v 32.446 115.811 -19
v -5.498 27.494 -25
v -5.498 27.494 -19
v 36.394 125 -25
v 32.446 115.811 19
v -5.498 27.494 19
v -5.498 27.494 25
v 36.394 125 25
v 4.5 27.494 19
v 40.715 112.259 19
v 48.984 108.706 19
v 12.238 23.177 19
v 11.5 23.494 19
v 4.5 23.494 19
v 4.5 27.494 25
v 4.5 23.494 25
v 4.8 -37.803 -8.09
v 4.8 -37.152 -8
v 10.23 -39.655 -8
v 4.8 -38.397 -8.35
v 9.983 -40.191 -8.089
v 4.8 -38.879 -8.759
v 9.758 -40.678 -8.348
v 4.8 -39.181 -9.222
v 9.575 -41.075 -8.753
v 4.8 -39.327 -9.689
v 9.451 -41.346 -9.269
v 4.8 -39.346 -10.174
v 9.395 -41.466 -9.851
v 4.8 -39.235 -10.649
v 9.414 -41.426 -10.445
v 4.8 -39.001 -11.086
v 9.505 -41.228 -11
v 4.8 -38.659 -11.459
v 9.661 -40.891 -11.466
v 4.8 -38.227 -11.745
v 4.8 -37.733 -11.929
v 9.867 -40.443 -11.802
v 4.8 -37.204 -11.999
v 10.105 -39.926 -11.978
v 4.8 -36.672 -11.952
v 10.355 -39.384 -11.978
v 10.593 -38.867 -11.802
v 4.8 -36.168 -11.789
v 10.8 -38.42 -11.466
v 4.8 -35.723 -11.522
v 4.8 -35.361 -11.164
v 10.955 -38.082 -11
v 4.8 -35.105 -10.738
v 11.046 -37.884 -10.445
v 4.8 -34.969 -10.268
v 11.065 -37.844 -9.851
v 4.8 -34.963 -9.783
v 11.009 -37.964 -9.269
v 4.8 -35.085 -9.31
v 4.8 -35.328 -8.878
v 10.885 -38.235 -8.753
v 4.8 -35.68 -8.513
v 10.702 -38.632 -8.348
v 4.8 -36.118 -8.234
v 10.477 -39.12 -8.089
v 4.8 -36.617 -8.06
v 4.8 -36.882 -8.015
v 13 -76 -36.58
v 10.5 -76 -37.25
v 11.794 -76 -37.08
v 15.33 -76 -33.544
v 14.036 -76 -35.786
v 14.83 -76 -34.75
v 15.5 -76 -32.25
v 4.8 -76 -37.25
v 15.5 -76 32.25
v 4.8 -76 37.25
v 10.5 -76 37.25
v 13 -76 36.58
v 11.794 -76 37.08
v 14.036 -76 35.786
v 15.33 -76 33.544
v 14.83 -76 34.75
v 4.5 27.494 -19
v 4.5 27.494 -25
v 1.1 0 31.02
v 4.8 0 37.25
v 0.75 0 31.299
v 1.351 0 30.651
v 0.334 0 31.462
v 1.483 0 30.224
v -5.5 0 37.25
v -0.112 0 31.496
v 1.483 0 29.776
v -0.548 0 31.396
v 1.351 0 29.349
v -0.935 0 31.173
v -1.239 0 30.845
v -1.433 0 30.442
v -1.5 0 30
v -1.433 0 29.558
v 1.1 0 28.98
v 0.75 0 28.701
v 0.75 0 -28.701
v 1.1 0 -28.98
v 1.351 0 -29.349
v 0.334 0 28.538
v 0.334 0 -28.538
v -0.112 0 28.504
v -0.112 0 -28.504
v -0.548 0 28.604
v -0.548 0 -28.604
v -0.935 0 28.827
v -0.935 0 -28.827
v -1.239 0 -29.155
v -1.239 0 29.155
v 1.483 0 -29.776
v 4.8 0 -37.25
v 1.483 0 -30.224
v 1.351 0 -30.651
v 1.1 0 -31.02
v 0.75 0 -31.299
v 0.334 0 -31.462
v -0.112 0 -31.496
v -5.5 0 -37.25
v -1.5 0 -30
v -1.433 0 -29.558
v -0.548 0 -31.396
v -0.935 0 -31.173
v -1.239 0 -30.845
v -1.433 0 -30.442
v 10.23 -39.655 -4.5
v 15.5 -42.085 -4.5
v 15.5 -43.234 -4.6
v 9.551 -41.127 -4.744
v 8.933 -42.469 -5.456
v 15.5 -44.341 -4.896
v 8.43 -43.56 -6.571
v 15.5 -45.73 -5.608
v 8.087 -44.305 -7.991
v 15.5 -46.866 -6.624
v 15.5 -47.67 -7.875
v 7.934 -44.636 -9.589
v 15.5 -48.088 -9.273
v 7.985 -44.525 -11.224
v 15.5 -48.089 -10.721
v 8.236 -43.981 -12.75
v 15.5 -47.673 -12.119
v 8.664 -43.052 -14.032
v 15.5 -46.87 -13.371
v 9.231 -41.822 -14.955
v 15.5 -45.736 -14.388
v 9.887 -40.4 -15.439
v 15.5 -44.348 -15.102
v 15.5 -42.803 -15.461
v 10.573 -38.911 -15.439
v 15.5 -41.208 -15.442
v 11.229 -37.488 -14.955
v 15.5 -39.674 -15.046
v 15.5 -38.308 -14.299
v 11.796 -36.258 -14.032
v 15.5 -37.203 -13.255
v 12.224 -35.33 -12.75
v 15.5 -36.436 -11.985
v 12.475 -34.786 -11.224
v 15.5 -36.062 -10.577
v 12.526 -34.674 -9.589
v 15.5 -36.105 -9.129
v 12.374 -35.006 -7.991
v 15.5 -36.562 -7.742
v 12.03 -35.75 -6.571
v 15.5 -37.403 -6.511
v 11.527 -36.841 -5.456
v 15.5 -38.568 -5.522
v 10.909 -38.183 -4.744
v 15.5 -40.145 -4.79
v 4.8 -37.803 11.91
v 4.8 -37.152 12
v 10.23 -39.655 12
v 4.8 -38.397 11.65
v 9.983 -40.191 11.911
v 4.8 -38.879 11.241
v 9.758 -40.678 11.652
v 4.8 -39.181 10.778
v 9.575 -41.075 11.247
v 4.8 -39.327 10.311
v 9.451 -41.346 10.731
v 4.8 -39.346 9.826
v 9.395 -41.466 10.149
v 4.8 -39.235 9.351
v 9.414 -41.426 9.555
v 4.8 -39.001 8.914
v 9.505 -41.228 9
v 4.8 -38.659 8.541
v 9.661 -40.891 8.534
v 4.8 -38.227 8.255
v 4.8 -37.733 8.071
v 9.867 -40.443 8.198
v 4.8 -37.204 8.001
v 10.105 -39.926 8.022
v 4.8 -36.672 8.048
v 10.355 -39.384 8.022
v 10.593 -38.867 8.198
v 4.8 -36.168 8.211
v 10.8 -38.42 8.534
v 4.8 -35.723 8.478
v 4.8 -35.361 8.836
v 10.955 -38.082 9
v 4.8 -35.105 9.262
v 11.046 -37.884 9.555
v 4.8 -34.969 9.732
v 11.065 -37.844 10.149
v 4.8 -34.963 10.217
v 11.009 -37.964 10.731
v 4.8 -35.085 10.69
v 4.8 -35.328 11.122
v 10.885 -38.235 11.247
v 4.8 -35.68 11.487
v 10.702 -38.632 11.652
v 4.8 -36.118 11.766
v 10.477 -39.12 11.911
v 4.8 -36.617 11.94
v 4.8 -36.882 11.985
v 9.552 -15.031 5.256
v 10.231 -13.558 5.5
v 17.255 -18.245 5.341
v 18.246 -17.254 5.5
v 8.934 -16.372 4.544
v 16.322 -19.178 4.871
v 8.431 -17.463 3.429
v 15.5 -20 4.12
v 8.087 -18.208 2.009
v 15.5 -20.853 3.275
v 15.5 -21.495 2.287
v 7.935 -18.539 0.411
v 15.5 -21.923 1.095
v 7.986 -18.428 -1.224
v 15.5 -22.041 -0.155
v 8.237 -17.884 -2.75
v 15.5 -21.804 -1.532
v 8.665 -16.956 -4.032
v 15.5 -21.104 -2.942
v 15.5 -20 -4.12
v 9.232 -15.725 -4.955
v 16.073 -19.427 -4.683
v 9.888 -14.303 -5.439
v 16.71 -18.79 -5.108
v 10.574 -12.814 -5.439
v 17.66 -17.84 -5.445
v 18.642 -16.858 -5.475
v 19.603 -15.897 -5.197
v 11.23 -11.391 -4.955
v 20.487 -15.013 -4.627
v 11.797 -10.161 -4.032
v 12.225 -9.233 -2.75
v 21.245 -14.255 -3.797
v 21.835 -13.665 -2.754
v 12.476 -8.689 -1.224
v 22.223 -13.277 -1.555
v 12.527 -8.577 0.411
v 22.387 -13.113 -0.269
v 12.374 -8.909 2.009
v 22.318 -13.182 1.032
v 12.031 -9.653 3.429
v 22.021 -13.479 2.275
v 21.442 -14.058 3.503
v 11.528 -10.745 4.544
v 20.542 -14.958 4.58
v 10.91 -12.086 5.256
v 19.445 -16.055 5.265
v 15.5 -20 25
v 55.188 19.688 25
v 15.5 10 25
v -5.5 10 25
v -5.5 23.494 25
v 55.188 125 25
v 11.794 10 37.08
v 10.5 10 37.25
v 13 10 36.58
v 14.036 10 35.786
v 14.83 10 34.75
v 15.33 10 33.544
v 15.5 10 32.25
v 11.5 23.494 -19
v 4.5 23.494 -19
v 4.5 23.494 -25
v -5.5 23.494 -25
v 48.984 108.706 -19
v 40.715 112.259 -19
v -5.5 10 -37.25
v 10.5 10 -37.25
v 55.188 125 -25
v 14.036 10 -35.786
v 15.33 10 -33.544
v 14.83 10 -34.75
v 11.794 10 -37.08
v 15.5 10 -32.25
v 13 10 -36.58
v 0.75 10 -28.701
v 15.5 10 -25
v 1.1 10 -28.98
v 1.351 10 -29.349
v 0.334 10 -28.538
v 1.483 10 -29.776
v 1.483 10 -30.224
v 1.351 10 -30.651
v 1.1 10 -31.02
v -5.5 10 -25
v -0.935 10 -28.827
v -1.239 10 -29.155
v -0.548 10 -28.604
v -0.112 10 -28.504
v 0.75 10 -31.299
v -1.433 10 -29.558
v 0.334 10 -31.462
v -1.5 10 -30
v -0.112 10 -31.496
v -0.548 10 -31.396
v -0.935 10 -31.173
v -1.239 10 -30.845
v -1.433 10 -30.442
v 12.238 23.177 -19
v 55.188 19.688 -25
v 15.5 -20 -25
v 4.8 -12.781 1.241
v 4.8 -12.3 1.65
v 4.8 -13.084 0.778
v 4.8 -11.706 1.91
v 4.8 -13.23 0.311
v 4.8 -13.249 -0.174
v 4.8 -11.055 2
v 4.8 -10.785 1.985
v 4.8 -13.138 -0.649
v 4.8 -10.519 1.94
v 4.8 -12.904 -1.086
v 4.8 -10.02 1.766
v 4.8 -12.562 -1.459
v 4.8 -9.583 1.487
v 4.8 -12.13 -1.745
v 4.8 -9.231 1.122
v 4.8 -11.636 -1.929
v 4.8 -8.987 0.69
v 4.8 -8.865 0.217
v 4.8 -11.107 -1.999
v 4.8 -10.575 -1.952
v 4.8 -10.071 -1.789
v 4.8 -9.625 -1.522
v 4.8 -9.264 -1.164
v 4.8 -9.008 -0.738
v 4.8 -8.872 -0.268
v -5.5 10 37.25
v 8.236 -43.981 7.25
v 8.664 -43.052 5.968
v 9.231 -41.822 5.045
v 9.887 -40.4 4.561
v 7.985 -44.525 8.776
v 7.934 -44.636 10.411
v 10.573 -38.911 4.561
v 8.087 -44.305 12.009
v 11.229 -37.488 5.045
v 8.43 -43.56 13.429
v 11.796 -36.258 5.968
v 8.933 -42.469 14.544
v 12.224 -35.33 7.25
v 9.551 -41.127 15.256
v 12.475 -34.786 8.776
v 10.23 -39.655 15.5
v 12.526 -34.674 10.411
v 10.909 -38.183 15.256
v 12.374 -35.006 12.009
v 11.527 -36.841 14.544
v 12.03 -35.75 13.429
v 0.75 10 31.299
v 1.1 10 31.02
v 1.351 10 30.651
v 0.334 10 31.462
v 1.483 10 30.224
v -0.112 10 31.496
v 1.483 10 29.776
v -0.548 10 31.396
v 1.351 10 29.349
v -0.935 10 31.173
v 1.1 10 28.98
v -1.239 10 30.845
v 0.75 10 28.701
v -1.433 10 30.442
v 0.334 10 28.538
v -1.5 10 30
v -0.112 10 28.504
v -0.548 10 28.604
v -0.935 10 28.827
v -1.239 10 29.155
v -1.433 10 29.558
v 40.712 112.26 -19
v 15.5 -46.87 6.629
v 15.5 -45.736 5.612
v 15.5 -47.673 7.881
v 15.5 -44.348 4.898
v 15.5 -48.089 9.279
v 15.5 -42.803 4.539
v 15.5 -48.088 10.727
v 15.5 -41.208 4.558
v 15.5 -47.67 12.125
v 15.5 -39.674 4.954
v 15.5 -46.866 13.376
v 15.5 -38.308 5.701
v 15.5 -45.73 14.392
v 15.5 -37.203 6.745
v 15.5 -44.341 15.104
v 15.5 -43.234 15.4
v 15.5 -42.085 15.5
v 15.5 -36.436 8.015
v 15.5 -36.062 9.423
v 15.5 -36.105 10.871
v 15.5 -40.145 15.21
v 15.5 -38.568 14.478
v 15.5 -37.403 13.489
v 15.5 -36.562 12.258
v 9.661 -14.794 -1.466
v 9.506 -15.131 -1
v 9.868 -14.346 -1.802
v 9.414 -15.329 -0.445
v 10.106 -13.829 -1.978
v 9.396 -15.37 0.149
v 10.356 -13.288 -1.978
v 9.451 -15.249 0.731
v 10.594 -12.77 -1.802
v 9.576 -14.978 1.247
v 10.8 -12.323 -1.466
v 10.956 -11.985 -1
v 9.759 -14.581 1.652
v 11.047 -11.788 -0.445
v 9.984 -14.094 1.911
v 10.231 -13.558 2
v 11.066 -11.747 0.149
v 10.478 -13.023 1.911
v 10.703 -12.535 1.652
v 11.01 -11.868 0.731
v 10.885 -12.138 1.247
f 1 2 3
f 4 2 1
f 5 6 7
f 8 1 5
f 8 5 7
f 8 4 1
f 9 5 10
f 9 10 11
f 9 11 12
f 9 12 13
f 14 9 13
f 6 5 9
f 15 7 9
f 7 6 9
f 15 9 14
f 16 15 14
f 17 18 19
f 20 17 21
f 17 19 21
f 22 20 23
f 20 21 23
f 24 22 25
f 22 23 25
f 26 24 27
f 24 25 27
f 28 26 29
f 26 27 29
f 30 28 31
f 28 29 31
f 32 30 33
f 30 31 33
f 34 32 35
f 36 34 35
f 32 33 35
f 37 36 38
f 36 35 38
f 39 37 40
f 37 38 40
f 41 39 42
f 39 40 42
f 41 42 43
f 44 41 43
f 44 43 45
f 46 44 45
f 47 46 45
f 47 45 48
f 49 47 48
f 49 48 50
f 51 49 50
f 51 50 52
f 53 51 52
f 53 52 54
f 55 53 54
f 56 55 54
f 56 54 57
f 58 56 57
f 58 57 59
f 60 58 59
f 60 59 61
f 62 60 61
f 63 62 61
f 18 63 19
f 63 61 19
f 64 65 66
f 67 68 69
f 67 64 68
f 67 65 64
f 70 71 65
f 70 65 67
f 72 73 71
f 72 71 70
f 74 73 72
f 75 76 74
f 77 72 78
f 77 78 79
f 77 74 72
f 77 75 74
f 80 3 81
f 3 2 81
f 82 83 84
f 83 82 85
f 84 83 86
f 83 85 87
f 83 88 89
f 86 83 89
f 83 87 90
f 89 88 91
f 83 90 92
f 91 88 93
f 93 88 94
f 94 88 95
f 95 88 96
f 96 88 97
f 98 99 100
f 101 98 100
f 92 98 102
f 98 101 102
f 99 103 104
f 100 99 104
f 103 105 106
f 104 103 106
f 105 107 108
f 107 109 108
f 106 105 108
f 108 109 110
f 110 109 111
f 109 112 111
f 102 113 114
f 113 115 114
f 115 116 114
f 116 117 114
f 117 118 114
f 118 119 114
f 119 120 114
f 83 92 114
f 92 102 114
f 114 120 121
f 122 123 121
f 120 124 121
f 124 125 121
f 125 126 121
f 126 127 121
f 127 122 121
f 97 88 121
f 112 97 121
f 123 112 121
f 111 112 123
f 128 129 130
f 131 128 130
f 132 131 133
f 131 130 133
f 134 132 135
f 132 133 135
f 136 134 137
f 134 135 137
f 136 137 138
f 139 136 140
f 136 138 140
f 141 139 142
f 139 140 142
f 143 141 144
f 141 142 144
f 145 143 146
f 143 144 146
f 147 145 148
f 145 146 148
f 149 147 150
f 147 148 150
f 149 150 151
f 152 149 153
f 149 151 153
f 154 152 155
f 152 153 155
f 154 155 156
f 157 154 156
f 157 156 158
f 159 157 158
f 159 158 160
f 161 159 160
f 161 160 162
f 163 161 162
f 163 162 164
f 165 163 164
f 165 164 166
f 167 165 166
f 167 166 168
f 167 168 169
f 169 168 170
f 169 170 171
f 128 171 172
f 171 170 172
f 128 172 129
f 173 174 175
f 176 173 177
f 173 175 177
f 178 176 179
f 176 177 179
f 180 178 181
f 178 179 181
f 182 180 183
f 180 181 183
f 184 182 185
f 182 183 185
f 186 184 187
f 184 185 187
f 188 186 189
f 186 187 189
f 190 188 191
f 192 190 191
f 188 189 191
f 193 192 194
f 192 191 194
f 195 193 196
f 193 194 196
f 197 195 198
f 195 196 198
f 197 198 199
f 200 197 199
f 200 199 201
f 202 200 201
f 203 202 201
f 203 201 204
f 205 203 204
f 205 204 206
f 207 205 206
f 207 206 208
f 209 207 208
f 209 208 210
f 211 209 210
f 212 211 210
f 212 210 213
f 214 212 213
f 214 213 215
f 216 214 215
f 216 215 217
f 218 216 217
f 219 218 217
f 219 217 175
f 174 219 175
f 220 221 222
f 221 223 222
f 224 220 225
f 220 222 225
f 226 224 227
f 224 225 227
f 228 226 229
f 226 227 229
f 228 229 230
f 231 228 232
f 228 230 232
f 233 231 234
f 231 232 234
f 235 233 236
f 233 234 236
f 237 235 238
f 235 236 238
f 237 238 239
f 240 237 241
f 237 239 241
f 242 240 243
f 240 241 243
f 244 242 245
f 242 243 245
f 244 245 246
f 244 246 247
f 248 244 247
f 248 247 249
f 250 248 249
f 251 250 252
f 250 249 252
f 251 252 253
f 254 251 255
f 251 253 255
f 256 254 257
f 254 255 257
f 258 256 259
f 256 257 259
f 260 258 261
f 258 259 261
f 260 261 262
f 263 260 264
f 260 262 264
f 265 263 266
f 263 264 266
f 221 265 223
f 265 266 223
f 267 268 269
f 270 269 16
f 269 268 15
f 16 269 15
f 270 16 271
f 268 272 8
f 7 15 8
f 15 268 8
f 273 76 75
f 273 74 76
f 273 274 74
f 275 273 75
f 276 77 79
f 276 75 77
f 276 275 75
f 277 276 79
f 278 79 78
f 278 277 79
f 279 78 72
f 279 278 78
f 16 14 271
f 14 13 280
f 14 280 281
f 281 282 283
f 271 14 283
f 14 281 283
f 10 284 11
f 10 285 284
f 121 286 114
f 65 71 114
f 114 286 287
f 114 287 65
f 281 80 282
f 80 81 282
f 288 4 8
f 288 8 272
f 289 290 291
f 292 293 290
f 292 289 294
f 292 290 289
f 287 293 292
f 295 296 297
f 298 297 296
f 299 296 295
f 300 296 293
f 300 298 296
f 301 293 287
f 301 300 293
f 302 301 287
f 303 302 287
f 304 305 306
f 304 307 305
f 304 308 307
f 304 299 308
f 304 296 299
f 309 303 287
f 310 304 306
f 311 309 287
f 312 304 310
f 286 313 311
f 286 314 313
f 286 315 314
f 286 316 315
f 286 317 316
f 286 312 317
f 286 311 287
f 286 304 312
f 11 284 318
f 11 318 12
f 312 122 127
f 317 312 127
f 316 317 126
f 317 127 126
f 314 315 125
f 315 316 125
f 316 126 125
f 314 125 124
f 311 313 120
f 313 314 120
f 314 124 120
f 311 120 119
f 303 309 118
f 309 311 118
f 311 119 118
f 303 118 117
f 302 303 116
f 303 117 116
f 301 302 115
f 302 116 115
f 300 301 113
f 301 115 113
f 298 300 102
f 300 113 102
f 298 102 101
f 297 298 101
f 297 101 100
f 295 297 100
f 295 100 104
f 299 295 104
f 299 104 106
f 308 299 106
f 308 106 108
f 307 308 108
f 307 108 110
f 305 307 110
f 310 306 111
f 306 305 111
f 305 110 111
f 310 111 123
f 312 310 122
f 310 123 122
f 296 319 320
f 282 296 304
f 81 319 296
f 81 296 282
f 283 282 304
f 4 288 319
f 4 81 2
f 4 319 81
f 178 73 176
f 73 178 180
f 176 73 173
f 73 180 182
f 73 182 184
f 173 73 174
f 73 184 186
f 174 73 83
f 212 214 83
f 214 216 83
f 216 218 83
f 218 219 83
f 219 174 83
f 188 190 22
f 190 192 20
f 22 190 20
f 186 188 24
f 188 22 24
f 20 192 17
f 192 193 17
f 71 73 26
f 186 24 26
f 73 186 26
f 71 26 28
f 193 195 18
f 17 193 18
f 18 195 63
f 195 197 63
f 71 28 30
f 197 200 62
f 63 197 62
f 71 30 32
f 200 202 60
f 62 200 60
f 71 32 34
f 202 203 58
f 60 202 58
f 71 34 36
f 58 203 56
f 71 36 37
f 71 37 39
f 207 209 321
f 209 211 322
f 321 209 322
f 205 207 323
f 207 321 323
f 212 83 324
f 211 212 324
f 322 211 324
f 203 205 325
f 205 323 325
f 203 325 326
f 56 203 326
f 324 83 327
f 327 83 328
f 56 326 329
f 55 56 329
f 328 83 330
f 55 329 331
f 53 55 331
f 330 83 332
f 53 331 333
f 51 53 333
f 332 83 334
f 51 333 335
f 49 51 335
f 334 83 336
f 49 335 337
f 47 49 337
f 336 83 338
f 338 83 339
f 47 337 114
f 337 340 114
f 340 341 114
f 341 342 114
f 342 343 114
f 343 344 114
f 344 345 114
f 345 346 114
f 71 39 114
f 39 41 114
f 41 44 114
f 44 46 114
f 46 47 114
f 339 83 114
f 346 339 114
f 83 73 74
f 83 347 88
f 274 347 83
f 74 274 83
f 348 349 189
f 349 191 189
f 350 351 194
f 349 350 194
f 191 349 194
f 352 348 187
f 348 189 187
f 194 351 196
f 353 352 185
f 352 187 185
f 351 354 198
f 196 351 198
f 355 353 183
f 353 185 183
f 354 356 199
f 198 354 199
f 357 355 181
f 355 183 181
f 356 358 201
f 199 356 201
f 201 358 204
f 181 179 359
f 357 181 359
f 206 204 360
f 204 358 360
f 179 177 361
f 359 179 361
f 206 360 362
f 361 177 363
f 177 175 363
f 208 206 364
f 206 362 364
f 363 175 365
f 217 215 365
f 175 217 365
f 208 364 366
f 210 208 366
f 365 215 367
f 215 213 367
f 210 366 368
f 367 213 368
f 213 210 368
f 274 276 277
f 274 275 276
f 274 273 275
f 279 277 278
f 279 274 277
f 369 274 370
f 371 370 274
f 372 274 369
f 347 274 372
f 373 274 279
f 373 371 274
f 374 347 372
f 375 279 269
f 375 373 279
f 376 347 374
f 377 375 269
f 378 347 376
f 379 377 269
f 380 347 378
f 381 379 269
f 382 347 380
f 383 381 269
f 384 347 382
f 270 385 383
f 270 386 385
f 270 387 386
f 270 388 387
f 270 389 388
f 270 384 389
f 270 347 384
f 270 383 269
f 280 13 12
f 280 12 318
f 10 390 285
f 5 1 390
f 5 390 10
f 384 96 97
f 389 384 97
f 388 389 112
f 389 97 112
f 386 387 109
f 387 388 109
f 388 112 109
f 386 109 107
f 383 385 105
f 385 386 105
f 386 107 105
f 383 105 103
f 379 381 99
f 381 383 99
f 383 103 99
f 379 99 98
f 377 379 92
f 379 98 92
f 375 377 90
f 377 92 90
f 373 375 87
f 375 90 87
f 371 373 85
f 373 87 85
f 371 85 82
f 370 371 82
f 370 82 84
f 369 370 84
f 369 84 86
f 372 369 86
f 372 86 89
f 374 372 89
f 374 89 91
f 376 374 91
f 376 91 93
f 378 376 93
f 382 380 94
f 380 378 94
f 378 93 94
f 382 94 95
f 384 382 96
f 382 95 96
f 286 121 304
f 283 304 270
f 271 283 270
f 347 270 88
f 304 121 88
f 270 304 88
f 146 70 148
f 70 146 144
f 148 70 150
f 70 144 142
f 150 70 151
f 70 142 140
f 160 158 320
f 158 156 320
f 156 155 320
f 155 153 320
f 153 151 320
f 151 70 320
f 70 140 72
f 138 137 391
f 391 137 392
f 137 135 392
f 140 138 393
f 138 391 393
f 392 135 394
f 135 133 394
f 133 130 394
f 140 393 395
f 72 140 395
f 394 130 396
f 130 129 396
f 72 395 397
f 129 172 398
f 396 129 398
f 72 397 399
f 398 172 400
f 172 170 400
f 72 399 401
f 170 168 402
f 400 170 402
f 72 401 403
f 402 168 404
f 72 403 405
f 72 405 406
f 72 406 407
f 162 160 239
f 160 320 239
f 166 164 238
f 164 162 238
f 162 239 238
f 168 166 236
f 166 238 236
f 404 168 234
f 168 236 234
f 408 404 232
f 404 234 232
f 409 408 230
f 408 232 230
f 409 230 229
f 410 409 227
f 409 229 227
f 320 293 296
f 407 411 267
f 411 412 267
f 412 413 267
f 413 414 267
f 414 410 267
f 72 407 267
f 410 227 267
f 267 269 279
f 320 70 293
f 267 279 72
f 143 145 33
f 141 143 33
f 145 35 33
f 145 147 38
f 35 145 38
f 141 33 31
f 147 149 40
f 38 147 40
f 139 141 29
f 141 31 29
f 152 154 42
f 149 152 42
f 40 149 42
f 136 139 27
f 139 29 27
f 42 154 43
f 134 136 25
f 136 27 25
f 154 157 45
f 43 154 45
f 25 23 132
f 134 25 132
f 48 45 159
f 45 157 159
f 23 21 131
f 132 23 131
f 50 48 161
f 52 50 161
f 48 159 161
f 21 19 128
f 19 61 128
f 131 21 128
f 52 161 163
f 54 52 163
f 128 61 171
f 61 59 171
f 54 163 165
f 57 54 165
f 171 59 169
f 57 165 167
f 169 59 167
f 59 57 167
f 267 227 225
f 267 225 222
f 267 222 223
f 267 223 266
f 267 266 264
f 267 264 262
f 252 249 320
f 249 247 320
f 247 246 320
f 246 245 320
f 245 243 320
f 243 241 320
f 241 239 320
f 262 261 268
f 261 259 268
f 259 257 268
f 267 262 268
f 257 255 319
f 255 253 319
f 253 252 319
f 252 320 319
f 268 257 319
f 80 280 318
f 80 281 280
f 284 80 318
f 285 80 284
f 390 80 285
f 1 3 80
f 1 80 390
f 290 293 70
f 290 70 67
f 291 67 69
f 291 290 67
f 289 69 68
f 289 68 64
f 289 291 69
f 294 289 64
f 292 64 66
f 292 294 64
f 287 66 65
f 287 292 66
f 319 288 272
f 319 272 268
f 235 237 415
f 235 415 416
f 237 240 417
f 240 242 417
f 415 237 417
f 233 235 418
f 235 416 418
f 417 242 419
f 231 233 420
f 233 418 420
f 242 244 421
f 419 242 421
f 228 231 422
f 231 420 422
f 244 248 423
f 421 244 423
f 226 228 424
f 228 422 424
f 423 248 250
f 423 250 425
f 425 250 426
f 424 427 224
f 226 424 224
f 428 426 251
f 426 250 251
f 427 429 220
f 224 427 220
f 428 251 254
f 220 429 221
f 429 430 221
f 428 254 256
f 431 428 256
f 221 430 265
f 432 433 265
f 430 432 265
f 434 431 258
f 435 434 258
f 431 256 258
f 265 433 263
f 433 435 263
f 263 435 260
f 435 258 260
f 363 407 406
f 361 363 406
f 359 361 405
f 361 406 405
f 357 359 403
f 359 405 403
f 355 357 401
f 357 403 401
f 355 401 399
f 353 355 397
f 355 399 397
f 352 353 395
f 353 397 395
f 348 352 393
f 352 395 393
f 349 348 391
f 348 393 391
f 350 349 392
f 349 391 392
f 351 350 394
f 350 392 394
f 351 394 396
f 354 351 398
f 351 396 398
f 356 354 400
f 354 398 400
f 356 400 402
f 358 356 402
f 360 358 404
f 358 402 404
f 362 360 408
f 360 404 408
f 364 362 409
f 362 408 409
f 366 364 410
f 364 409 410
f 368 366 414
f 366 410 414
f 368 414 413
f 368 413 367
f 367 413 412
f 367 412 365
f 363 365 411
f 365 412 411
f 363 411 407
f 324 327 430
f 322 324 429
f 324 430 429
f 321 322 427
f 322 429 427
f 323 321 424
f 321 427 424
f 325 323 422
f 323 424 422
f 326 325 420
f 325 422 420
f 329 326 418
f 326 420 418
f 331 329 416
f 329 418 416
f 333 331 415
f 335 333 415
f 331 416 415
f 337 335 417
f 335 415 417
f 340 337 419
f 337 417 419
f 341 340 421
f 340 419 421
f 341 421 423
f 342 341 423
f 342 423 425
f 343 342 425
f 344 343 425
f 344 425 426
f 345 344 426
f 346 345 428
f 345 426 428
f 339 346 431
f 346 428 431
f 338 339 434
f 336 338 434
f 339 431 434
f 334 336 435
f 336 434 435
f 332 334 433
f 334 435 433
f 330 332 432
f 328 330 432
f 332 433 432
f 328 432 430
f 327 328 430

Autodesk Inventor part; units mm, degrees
sketch "Sketch1" plane through (0, 0, 0) normal (0, 1, 0) x (-1, 0, 0)
  line L0 (5.5, 37.25) -> (-5.5, 37.25)
  line L1 (-5.5, 37.25) -> (-5.5, -37.25)
  line L2 (-5.5, -37.25) -> (5.5, -37.25)
  line L3 (5.5, -37.25) -> (5.5, 37.25)
  line L4 (5.5, 37.25) -> (-5.5, -37.25) construction
  line L5 (-5.5, 37.25) -> (5.5, -37.25) construction
  circle A0 centre (0, 30) radius 1.5
  line L6 (5.5, 0) -> (-5.5, 0)
  circle A1 centre (0, -30) radius 1.5
  line L7 (-5.5, -25) -> (5.5, -25)
  line L8 (5.5, -25) -> (5.5, 25)
  line L9 (5.5, 25) -> (-5.5, 25)
  line L10 (-5.5, 25) -> (-5.5, -25)
  line L11 (-5.5, -25) -> (5.5, 25) construction
  line L12 (5.5, -25) -> (-5.5, 25) construction
  point P0 (0, 0)
  dimension "d0" = 11
  dimension "d1" = 74.5
  dimension "d2" = 3
  dimension "d3" = 7.25
  dimension "d28" = 50
extrude "Extrusion1" add sketch "Sketch1" along normal blind 10
sketch "Sketch2" plane through (5.5, 0, 37.25) normal (1, 0, 0) x (0, 0, -1)
  line L0 (0, 10) -> (74.5, 10) projected
  line L1 (0, 0) -> (74.5, 0) projected
  line L2 (0, 10) -> (74.5, 10)
  line L3 (74.5, 10) -> (74.5, 0)
  line L4 (74.5, 0) -> (0, 0)
  line L5 (0, 0) -> (0, 10)
  point P0 (37.25, 0)
extrude "Extrusion2" add sketch "Sketch2" along normal blind 10
sketch "Sketch3" plane through (0, 0, 0) normal (0, -1, 0) x (1, 0, 0)
  line L0 (-5.5, 37.25) -> (15.5, 37.25) projected
  line L1 (-5.5, -37.25) -> (15.5, -37.25) projected
  line L2 (15.5, 37.25) -> (4.8, 37.25)
  line L3 (4.8, 37.25) -> (4.8, -37.25)
  line L4 (4.8, -37.25) -> (15.5, -37.25)
  line L5 (15.5, -37.25) -> (15.5, 37.25)
  point P0 (0, 0)
  dimension "d9" = 10.7
extrude "Extrusion3" add sketch "Sketch3" along normal blind 76
ref_plane "Work Plane1" through (15.5, -76, -37.25) normal (-0.9081432, 0.4186597, 0) x (0, 0, 1)
ref_plane "Work Plane3" through (10.9593, -73.9067, -37.25) normal (-0.9081432, 0.4186597, 0) x (0, 0, 1)
sketch "Sketch4" plane through (10.9593, -73.9067, -37.25) normal (-0.9081432, 0.4186597, 0) x (0, 0, 1)
  circle A0 centre (37.25, 54.5) radius 2
  circle A1 centre (37.25, 54.5) radius 5.5
  circle A2 centre (27.25, 30.8) radius 2
  circle A3 centre (27.25, 30.8) radius 5.5
  line L0 (37.25, 62.5297) -> (37.25, 0)
  line L1 (0, 0) -> (74.5, 0) projected
  circle A4 centre (47.25, 30.8) radius 5.5
  circle A5 centre (47.25, 30.8) radius 2
  point P0 (37.25, 0)
  dimension "d13" = 4
  dimension "d14" = 11
  dimension "d15" = 4
  dimension "d16" = 11
  dimension "d19" = 10
  dimension "d20" = 23.7
  dimension "d23" = 54.5
extrude "Extrusion4" cut sketch "Sketch4" along normal blind 15 contours A0 L0 | A0 L0 A1 | L0 A0 | A0 L0 A1 | A2 | A3 | A4 | A5
extrude "Extrusion11" cut sketch "Sketch4" along normal blind 25.925 contours A0 L0 | A0 L0 A1 | L0 A0 | A0 L0 A1
extrude "Extrusion6" cut sketch "Sketch4" along normal through all contours A0 L0 | L0 A0 | A2 | A5
extrude "Extrusion7" add sketch "Sketch1" along normal blind 125 contours L3 L6 L1 L9 | L3 L7 L1 L6
sketch "Sketch5" plane through (5.5, 10, -25) normal (1, 0, 0) x (0, 0, -1)
  line L0 (0, 0) -> (0, 115) projected
  line L1 (0, 115) -> (0, 0)
  line L2 (0, 0) -> (-50, 0)
  line L3 (-50, 0) -> (-50, 115)
  line L4 (0, 115) -> (-50, 115)
  point P0 (-25, -10)
extrude "Extrusion8" add sketch "Sketch5" along normal blind 40
chamfer "Chamfer1" distance 40 angle 23.25 1 edges at (-5.5, 125, 0) measured on face at (-5.5, 48.3333, -8.3333)
chamfer "Chamfer2" distance 30 distance2 30 1 edges at (15.5, 10, 0)
sketch "Sketch8" plane through (11.6854, 125, -25) normal (-0.9187912, 0.3947439, 0) x (0, 0, 1)
  line L0 (0, 0) -> (0, 13.3481) projected
  line L1 (-12.25, -121.6327) -> (62.25, -121.6327) projected
  line L2 (0, 13.3481) -> (50, 13.3481)
  line L3 (50, 13.3481) -> (50, -121.6327)
  line L4 (50, -121.6327) -> (0, -121.6327)
  line L5 (0, -121.6327) -> (0, 13.3481)
  point P0 (25, -119.4616)
  point P1 (0, 0)
  dimension "d59" = 50
extrude "Extrusion12" cut sketch "Sketch8" against normal blind 22.7
ref_plane "Work Plane4" through (64.6996, 102.2233, -25) normal (-0.9187912, 0.3947439, 0) x (0, 0, 1)
ref_plane "Work Plane5" through (32.5419, 116.0393, -25) normal (-0.9187912, 0.3947439, 0) x (0, 0, 1)
ref_plane "Work Plane6" through (-5.5, 27.4944, -18.625) normal (0.3947439, 0.9187912, 0) x (0, 0, -1)
sketch "Sketch11" plane through (15.5, 10, -25) normal (0, 0, -1) x (-1, 0, 0)
  line L0 (21, 17.4944) -> (-6.8294, 82.2691) projected
  line L1 (21, 17.4944) -> (11, 17.4944)
  line L2 (11, 17.4944) -> (11, 13.4944)
  line L3 (11, 13.4944) -> (21, 13.4944)
  line L4 (21, 13.4944) -> (21, 17.4944)
  point P0 (15.5, -10)
  dimension "d76" = 10
  dimension "d77" = 4
extrude "Extrusion15" cut sketch "Sketch11" against normal blind 70.5
fillet "Fillet1" radius 5 2 edges at (15.5, -33, 37.25) (15.5, -33, -37.25)
sketch "Sketch12" plane through (32.5419, 116.0393, -25) normal (-0.9187912, 0.3947439, 0) x (0, 0, 1)
  line L0 (6, -0.2473) -> (44, -0.2473)
  line L1 (44, -0.2473) -> (44, -96.0989)
  line L2 (6, -96.0989) -> (6, -0.2473)
  line L3 (0, -96.3711) -> (0, 9.7527) projected
  line L4 (50, 9.7527) -> (50, -96.3711) projected
  line L5 (0, 9.7527) -> (50, 9.7527) projected
  line L6 (44, -96.0989) -> (44, -96.8375)
  line L7 (44, -96.8375) -> (6, -96.8375)
  line L8 (6, -96.8375) -> (6, -96.0989)
  point P0 (25, -119.4616)
  dimension "d81" = 6
  dimension "d82" = 6
  dimension "d83" = 10
extrude "Extrusion16" cut sketch "Sketch12" against normal blind 9
sketch "Sketch14" plane through (4.5, 23.4944, -25) normal (-1, 0, 0) x (0, 0, 1)
  line L0 (6, 4) -> (6, 92.3177) projected
  line L1 (6, 4) -> (44, 4)
  line L2 (44, 4) -> (44, 0)
  line L3 (44, 0) -> (6, 0)
  line L4 (6, 0) -> (6, 4)
  point P0 (25, -23.4944)
  point P1 (6, 19)
extrude "Extrusion18" cut sketch "Sketch14" against normal blind 7
sketch "Sketch15" plane through (15.5, 10, -25) normal (0, 0, -1) x (-1, 0, 0)
  line L0 (-30, 115) -> (-39.6875, 115)
  line L1 (-39.6875, 115) -> (-39.6875, 9.6875)
  line L2 (-30, 0) -> (-39.6875, 9.6875)
  line L3 (0, -30) -> (-30, 0) projected
  line L4 (21, 13.4944) -> (11, 13.4944) projected
  line L5 (11, 13.4944) -> (11, 17.4944) projected
  line L6 (11, 17.4944) -> (21, 17.4944) projected
  line L7 (21, 17.4944) -> (-20.8917, 115) construction
  line L8 (-20.8917, 115) -> (-30, 115) projected
  line L9 (-30, 0) -> (-30, 115) projected
  line L10 (0, -30) -> (-30, 0) projected
  line L11 (0, 0) -> (0, -30) projected
  line L12 (21, 0) -> (0, 0) projected
  line L13 (21, 0) -> (21, 13.4944) projected
  point P0 (15.5, -10)
  dimension "d91" = 135
extrude "Extrusion19" add sketch "Sketch15" against normal blind 50
sketch "Sketch16" plane through (40.811, 112.4866, -25) normal (-0.9187912, 0.3947439, 0) x (0, 0, 1)
  line L0 (6, -96.3711) -> (6, -0.2473) projected
  line L1 (44, -93.3357) -> (6, -93.3357) projected
  line L2 (6, -0.2473) -> (44, -0.2473)
  line L3 (44, -0.2473) -> (44, -93.3357)
  line L4 (44, -93.3357) -> (6, -93.3357)
  line L5 (6, -93.3357) -> (6, -0.2473)
  point P0 (25, -119.4616)
extrude "Extrusion20" cut sketch "Sketch16" against normal blind 9
properties part number "Camera Bracket"
